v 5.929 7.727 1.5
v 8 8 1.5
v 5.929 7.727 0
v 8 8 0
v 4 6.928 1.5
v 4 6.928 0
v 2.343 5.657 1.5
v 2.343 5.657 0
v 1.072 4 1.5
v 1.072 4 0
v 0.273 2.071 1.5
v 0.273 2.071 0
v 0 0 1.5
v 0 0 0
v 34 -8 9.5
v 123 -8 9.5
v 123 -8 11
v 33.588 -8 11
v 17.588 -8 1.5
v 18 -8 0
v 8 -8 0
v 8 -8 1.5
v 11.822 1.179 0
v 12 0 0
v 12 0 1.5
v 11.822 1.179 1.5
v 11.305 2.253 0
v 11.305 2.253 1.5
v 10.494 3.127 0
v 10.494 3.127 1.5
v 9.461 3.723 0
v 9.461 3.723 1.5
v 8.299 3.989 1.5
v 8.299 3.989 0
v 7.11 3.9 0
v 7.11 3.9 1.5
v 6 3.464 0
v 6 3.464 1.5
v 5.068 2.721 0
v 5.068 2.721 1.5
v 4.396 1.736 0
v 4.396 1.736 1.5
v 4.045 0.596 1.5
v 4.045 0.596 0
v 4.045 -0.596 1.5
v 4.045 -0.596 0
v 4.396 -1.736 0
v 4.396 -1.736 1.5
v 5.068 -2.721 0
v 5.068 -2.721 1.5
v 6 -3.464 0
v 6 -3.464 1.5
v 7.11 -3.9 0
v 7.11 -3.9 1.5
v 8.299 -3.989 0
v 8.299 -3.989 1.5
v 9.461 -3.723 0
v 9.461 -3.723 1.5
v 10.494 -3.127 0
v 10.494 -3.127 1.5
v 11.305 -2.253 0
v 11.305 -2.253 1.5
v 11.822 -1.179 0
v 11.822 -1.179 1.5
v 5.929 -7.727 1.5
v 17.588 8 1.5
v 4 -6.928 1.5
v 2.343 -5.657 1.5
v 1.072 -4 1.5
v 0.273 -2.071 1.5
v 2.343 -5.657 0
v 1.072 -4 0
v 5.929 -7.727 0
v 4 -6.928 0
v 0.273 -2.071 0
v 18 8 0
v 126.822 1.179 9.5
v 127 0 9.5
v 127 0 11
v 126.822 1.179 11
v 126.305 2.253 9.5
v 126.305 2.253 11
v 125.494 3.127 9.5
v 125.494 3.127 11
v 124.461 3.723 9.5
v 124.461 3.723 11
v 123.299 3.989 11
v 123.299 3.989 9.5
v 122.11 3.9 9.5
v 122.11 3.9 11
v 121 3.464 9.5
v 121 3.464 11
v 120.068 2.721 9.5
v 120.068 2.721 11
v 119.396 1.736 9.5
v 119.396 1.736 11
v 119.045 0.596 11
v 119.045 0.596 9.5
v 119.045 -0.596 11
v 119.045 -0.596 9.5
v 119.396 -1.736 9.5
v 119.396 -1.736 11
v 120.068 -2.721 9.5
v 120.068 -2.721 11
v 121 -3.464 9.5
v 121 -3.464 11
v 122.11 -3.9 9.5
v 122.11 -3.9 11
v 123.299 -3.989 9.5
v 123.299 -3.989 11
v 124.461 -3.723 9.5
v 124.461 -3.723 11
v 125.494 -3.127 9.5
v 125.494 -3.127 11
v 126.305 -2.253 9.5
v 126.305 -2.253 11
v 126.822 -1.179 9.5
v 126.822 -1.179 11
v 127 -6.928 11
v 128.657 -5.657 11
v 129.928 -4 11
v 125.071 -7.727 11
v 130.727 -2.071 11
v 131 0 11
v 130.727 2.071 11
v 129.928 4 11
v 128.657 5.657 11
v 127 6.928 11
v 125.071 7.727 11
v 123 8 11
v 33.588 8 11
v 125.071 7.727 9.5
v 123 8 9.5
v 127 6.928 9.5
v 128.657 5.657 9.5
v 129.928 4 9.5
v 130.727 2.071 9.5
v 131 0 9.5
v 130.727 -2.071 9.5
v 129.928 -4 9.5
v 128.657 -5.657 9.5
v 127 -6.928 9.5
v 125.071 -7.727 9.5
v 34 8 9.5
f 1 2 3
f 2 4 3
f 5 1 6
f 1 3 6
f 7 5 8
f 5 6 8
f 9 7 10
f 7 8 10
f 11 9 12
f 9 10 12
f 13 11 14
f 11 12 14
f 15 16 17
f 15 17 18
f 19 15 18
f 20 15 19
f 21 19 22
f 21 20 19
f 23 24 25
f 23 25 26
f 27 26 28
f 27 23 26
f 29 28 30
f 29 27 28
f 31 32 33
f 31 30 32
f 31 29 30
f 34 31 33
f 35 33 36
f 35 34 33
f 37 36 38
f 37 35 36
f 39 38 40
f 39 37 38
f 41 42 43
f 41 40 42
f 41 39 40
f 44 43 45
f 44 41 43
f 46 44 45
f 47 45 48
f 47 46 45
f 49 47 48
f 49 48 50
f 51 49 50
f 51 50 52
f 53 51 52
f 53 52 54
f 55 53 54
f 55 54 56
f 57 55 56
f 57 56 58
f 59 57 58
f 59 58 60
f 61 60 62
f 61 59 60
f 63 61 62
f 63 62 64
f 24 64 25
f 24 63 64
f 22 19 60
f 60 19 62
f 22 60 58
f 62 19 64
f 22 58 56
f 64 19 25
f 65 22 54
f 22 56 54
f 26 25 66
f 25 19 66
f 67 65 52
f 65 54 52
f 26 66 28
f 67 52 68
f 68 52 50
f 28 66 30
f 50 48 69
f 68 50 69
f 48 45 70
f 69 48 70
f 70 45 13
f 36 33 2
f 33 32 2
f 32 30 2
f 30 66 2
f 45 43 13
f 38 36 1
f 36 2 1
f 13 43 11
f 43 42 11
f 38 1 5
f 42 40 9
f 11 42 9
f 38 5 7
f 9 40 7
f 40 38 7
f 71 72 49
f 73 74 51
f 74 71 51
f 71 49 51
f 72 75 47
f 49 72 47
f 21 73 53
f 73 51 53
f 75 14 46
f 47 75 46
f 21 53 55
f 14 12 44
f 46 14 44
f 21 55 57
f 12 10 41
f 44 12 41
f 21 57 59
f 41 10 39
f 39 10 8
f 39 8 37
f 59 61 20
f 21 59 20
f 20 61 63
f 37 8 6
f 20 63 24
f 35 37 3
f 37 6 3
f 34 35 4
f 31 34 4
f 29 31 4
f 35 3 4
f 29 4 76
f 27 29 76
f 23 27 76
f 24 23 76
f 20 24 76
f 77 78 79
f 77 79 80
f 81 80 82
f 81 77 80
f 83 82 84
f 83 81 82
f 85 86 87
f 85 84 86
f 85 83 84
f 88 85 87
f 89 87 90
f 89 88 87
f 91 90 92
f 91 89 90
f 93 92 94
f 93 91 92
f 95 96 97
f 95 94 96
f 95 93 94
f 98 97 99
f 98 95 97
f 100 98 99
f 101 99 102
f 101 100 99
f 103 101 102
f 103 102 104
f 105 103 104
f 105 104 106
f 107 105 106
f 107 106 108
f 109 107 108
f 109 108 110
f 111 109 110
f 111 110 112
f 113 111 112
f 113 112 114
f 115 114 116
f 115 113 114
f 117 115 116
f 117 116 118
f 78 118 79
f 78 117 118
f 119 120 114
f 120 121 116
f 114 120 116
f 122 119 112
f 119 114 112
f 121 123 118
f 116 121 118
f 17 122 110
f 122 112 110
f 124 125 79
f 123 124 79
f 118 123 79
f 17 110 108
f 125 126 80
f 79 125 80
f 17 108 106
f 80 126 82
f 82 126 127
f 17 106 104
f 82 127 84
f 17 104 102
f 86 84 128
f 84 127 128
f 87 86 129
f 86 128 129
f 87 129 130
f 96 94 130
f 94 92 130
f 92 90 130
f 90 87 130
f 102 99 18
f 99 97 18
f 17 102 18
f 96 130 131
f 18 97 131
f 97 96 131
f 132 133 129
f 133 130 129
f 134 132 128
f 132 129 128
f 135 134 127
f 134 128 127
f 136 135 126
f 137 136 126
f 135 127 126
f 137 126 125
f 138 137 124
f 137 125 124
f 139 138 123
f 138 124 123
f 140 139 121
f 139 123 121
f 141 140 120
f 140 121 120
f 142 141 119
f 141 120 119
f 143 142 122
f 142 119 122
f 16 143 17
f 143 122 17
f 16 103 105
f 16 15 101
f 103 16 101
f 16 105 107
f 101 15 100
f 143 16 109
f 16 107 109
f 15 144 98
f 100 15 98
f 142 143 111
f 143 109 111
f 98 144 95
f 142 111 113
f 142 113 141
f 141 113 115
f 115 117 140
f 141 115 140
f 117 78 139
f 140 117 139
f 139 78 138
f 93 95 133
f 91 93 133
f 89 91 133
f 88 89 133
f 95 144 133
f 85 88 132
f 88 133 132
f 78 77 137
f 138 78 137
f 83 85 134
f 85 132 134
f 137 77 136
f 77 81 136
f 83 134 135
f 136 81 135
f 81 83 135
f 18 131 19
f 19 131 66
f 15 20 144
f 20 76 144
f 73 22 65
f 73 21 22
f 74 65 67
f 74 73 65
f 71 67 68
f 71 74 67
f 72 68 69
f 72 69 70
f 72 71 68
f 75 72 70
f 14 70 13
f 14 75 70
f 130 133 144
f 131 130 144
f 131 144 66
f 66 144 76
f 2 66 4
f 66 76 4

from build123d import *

# Parameters (mm, degrees)
EXTRUDE_1_DEPTH          = 8
FILLET_1_R               = 8
CUT_EXTRUDE_1_DEPTH      = 132.587423411
CUT_EXTRUDE_1_DEPTH_BACK = 132.587423411
SKETCH_2_R               = 4


with BuildPart() as part:
    # 草图1 → 拉伸-薄壁1 (new, symmetric)
    with BuildSketch(Plane(origin=(0, 0, 0), x_dir=(1, 0, 0), z_dir=(0, 1, 0))):
        Polygon((0, 0), (18, 0), (34, -9.5), (131, -9.5), (131, -11), (33.588243042, -11), (17.588243042, -1.5), (0, -1.5), align=None)
    extrude(amount=EXTRUDE_1_DEPTH, both=True)

    # 圆角1
    fillet_1_edges = [part.edges().sort_by_distance(p)[0] for p in [
        (131, -8, 10.25),
        (131, 8, 10.25),
        (0, -8, 0.75),
        (0, 8, 0.75),
    ]]
    fillet(fillet_1_edges, radius=FILLET_1_R - 0.0001)  # a hair under: the kernel refuses the full size

    # 草图2 → 切除-拉伸1 (cut, two sides: drawn at the far end of the back side and taken through both)
    with BuildSketch(Plane.XY.offset(1.5).offset(-CUT_EXTRUDE_1_DEPTH_BACK)):
        with Locations((8, 0)):
            Circle(SKETCH_2_R)
        with Locations((123, 0)):
            Circle(SKETCH_2_R)
    extrude(amount=CUT_EXTRUDE_1_DEPTH + CUT_EXTRUDE_1_DEPTH_BACK, mode=Mode.SUBTRACT)


solid = part.part
